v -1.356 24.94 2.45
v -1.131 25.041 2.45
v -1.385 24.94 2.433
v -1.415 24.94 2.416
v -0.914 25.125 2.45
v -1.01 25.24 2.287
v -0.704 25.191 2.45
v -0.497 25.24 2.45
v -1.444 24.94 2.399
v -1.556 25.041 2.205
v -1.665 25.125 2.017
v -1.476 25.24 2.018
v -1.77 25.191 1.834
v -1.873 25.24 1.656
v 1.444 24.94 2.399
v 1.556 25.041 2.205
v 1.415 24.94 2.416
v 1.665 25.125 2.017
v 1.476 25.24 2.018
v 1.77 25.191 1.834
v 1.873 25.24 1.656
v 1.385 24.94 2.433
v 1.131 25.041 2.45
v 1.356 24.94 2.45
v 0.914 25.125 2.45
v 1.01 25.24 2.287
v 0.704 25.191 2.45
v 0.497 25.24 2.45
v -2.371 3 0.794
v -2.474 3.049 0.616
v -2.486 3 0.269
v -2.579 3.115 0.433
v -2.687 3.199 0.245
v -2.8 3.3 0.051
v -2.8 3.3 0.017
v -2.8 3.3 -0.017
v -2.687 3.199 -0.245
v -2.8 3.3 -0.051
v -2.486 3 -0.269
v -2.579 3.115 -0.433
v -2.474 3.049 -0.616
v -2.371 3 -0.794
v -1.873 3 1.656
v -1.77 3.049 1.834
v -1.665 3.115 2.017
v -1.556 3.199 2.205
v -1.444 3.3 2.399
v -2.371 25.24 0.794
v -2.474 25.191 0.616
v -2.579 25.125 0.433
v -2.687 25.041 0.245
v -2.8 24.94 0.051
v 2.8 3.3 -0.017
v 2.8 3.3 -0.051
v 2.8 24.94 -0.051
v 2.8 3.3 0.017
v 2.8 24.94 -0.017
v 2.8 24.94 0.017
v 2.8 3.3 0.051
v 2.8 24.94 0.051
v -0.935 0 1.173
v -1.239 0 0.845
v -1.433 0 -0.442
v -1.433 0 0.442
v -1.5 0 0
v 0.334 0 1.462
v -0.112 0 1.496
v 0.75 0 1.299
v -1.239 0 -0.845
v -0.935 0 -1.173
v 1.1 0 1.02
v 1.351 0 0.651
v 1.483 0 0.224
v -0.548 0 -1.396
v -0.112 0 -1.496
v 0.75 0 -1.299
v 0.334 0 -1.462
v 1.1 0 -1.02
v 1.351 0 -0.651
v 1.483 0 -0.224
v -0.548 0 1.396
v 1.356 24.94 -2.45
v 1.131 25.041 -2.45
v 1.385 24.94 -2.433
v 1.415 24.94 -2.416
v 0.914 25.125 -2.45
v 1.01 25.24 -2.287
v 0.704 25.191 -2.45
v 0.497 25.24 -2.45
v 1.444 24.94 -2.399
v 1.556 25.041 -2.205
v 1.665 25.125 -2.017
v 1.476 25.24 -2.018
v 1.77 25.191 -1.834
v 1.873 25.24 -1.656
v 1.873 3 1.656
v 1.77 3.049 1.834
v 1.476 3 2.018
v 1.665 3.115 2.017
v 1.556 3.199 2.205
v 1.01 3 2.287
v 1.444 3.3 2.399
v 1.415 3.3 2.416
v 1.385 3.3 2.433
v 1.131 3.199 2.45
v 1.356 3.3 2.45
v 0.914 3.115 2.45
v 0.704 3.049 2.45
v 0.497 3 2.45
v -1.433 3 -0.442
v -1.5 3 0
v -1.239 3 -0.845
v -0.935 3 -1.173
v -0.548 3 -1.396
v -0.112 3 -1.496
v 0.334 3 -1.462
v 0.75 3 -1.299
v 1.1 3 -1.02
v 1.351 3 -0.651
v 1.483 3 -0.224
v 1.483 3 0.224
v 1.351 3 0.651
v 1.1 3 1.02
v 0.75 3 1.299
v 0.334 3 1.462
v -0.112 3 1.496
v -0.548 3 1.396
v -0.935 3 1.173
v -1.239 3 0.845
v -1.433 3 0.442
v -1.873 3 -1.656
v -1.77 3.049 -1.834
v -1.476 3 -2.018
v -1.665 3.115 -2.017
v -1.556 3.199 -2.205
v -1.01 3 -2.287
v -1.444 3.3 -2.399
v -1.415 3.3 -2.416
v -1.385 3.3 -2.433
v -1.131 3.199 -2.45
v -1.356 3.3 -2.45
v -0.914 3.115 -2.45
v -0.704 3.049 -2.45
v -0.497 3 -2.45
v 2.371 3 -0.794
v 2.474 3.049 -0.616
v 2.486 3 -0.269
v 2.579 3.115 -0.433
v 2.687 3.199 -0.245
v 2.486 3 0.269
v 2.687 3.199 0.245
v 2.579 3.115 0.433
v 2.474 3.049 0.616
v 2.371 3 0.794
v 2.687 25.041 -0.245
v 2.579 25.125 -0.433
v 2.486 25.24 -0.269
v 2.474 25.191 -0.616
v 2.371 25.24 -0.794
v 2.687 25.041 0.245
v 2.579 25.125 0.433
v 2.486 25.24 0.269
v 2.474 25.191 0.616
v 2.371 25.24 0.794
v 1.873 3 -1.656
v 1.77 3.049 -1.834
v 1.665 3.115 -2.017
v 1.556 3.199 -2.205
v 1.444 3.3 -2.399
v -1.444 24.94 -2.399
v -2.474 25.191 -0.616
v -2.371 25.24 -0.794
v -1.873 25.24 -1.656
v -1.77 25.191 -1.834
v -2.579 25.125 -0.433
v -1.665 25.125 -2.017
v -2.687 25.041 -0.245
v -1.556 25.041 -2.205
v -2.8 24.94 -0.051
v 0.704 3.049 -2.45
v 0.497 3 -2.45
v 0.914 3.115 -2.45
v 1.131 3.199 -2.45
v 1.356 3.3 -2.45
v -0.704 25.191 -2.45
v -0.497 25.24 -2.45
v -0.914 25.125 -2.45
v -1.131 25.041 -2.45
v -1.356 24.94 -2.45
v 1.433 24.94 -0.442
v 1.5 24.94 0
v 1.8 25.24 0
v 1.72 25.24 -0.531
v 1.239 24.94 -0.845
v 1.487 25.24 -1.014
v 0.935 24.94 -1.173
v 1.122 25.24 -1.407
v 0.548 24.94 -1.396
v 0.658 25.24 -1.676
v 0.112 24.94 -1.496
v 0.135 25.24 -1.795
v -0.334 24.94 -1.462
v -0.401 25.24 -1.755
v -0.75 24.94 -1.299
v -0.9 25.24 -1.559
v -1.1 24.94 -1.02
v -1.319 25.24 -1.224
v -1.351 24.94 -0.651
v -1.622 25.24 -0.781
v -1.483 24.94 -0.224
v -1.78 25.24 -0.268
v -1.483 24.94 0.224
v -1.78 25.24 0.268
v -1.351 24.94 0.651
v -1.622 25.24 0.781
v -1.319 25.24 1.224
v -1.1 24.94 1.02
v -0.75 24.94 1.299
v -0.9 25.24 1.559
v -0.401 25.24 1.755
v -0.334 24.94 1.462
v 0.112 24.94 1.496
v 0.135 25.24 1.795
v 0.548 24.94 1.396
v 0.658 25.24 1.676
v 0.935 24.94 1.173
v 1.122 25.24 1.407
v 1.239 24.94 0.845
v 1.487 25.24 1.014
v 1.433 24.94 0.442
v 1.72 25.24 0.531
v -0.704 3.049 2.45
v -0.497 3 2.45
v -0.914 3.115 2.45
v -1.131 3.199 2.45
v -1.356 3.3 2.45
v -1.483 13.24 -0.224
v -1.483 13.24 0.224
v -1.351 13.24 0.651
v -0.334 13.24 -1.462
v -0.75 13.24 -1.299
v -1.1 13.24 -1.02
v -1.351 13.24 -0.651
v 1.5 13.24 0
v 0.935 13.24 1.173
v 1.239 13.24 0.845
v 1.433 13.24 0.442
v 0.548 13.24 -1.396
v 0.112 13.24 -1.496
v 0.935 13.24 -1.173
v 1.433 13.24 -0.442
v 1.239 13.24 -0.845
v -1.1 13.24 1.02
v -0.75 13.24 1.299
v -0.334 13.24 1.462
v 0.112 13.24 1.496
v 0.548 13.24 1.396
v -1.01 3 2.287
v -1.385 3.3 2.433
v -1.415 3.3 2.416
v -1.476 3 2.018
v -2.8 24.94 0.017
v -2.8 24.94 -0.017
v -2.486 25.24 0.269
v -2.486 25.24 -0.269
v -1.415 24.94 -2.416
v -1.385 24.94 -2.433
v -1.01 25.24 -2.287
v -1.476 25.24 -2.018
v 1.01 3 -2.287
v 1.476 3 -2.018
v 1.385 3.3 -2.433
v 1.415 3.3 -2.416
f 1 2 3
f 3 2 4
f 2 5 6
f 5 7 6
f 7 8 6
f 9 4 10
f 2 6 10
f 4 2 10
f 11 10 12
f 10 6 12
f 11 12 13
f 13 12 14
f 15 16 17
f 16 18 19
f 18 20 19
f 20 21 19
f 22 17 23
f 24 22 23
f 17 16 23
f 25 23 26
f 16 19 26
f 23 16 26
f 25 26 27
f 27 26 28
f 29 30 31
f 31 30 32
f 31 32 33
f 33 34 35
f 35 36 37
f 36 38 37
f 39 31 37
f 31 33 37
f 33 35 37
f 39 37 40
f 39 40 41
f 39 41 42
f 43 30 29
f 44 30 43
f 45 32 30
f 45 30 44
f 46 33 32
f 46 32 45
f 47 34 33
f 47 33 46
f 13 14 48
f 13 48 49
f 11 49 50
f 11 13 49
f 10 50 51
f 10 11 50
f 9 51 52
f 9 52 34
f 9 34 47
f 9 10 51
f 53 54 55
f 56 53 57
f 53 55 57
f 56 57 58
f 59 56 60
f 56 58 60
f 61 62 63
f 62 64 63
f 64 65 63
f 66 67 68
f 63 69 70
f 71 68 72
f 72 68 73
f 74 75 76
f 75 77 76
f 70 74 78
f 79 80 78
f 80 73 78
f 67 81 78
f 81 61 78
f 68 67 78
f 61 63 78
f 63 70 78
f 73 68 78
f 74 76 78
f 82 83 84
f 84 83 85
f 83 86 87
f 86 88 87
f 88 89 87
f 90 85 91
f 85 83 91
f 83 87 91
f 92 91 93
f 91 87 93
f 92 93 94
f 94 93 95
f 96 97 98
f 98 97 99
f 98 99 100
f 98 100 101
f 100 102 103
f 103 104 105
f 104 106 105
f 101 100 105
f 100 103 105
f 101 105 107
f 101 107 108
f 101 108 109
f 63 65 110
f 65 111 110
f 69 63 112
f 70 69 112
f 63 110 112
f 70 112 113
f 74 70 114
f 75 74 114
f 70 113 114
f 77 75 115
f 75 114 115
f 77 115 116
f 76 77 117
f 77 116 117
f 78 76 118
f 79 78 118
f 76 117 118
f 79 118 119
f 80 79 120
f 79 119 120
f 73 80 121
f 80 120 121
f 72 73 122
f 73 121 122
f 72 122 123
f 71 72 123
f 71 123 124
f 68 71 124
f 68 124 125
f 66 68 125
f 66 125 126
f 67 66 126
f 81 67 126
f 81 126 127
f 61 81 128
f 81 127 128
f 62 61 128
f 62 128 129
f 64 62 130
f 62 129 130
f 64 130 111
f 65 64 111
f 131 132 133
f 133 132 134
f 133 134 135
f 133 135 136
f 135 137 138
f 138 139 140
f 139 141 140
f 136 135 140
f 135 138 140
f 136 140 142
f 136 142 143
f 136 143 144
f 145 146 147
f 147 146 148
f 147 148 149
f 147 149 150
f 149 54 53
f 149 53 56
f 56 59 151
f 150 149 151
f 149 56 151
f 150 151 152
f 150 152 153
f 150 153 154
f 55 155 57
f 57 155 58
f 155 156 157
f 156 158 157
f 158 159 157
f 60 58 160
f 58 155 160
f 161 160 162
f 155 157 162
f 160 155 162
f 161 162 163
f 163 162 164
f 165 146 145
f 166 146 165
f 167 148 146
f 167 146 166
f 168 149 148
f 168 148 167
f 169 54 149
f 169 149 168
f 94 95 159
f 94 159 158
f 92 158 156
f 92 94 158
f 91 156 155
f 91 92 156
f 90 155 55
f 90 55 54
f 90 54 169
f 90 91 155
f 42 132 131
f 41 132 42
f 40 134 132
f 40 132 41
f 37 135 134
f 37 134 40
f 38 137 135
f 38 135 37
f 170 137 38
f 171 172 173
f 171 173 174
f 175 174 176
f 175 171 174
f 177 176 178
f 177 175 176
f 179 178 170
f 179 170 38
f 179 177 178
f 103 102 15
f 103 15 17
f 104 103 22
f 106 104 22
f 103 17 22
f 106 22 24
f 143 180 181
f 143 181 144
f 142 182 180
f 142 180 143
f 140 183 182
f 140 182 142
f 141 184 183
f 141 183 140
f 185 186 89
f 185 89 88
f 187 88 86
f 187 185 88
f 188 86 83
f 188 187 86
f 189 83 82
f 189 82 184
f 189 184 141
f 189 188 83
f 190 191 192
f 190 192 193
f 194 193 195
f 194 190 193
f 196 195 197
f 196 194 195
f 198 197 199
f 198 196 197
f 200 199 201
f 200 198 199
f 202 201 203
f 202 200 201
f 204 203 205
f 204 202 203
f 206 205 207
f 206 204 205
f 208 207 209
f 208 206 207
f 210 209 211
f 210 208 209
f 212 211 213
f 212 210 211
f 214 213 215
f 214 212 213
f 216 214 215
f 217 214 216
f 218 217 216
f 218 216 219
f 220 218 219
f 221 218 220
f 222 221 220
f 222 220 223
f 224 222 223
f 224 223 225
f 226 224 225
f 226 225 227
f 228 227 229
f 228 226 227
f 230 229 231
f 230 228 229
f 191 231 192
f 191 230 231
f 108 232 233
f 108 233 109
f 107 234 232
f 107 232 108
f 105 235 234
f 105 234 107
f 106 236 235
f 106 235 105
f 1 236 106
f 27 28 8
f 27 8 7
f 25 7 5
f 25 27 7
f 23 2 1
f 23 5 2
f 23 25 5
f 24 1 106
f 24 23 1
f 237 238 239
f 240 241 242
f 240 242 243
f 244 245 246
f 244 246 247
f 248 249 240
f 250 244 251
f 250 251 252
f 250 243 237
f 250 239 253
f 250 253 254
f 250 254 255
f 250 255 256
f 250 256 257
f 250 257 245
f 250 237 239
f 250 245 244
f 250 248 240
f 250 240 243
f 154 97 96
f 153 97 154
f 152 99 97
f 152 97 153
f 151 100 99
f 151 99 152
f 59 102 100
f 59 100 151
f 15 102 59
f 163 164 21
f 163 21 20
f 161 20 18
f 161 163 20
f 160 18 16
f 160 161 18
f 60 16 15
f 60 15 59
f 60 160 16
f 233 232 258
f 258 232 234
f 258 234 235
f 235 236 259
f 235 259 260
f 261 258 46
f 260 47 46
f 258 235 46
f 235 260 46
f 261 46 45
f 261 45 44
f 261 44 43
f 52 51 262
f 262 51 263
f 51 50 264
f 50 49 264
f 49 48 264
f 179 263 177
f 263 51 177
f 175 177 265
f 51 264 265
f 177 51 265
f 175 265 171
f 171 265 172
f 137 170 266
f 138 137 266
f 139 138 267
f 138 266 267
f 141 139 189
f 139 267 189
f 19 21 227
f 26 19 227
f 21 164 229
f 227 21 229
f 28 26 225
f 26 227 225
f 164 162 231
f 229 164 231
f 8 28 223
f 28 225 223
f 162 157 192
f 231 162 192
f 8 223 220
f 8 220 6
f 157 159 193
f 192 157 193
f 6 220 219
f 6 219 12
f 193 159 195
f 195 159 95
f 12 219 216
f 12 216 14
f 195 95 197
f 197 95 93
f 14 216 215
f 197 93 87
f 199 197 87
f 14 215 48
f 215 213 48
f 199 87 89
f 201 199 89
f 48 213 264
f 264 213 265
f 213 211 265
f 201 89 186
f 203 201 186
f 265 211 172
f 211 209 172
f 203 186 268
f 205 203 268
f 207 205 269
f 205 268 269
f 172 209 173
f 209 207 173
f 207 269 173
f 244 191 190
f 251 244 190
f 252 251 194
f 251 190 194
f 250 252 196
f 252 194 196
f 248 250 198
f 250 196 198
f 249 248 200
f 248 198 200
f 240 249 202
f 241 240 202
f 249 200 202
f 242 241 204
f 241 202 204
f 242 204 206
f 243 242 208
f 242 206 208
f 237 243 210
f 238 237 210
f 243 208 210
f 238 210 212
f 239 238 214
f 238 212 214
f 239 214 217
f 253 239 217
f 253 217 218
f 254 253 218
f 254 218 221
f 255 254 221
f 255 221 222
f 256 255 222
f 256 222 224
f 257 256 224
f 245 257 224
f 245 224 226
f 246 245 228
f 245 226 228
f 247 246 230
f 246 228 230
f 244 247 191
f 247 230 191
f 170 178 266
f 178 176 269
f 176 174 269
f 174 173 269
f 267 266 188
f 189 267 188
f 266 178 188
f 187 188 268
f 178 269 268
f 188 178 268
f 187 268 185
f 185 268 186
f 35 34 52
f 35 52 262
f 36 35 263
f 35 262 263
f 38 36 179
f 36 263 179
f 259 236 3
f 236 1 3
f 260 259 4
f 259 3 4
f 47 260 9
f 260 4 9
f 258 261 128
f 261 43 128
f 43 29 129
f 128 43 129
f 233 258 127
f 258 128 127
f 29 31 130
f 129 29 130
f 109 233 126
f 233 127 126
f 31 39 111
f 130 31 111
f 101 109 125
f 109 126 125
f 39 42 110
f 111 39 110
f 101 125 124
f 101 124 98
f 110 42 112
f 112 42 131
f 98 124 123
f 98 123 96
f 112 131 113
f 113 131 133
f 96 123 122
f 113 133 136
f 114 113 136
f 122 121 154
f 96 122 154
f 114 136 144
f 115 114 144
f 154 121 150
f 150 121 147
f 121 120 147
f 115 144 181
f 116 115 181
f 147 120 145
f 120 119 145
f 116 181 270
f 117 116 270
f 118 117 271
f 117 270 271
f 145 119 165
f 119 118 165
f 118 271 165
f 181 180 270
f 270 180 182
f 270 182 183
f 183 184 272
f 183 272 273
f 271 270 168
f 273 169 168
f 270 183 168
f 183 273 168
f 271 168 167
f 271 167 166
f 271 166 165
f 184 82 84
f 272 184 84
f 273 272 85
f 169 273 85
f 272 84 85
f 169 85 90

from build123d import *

# Parameters (mm, degrees)
SKETCH3_R         = 1.5
EXTRUDE1_DEPTH    = 12
CHAMFER1_SIZE     = 0.3
SKETCH4_OUTSIDE_W = 12.89
SKETCH4_OUTSIDE_H = 12.89
EXTRUDE2_DEPTH    = 26.24


with BuildPart() as part:
    # Sketch2 → Revolve3 (revolve)
    with BuildSketch(Plane.XY):
        Polygon((0, 0), (-1.5, 0), (-1.5, 3), (-2.8, 3), (-2.8, 25.24), (0, 25.24), align=None)
    revolve(axis=Axis((0, 33.398198685, 0), (0, -1, 0)))

    # Sketch3 → Extrude1 (cut)
    with BuildSketch(Plane(origin=(0, 25.24, 0), x_dir=(1, 0, 0), z_dir=(0, 1, 0))):
        Circle(SKETCH3_R)
    extrude(amount=-EXTRUDE1_DEPTH, mode=Mode.SUBTRACT)

    # Chamfer1
    chamfer1_edges = [part.edges().sort_by_distance(p)[0] for p in [
        (-1.5, 25.24, 0),
        (2.8, 25.24, 0),
        (2.8, 3, 0),
    ]]
    chamfer(chamfer1_edges, length=CHAMFER1_SIZE)

    # Sketch4 outside → Extrude2 (cut, through all)
    with BuildSketch(Plane(origin=(0, 25.24, 0), x_dir=(1, 0, 0), z_dir=(0, 1, 0))):
        Rectangle(SKETCH4_OUTSIDE_W, SKETCH4_OUTSIDE_H)
        Polygon((2.829016319, 0), (1.41450816, 2.45), (-1.41450816, 2.45), (-2.829016319, 0), (-1.41450816, -2.45), (1.41450816, -2.45), align=None, mode=Mode.SUBTRACT)
    extrude(amount=-EXTRUDE2_DEPTH, mode=Mode.SUBTRACT)


solid = part.part
